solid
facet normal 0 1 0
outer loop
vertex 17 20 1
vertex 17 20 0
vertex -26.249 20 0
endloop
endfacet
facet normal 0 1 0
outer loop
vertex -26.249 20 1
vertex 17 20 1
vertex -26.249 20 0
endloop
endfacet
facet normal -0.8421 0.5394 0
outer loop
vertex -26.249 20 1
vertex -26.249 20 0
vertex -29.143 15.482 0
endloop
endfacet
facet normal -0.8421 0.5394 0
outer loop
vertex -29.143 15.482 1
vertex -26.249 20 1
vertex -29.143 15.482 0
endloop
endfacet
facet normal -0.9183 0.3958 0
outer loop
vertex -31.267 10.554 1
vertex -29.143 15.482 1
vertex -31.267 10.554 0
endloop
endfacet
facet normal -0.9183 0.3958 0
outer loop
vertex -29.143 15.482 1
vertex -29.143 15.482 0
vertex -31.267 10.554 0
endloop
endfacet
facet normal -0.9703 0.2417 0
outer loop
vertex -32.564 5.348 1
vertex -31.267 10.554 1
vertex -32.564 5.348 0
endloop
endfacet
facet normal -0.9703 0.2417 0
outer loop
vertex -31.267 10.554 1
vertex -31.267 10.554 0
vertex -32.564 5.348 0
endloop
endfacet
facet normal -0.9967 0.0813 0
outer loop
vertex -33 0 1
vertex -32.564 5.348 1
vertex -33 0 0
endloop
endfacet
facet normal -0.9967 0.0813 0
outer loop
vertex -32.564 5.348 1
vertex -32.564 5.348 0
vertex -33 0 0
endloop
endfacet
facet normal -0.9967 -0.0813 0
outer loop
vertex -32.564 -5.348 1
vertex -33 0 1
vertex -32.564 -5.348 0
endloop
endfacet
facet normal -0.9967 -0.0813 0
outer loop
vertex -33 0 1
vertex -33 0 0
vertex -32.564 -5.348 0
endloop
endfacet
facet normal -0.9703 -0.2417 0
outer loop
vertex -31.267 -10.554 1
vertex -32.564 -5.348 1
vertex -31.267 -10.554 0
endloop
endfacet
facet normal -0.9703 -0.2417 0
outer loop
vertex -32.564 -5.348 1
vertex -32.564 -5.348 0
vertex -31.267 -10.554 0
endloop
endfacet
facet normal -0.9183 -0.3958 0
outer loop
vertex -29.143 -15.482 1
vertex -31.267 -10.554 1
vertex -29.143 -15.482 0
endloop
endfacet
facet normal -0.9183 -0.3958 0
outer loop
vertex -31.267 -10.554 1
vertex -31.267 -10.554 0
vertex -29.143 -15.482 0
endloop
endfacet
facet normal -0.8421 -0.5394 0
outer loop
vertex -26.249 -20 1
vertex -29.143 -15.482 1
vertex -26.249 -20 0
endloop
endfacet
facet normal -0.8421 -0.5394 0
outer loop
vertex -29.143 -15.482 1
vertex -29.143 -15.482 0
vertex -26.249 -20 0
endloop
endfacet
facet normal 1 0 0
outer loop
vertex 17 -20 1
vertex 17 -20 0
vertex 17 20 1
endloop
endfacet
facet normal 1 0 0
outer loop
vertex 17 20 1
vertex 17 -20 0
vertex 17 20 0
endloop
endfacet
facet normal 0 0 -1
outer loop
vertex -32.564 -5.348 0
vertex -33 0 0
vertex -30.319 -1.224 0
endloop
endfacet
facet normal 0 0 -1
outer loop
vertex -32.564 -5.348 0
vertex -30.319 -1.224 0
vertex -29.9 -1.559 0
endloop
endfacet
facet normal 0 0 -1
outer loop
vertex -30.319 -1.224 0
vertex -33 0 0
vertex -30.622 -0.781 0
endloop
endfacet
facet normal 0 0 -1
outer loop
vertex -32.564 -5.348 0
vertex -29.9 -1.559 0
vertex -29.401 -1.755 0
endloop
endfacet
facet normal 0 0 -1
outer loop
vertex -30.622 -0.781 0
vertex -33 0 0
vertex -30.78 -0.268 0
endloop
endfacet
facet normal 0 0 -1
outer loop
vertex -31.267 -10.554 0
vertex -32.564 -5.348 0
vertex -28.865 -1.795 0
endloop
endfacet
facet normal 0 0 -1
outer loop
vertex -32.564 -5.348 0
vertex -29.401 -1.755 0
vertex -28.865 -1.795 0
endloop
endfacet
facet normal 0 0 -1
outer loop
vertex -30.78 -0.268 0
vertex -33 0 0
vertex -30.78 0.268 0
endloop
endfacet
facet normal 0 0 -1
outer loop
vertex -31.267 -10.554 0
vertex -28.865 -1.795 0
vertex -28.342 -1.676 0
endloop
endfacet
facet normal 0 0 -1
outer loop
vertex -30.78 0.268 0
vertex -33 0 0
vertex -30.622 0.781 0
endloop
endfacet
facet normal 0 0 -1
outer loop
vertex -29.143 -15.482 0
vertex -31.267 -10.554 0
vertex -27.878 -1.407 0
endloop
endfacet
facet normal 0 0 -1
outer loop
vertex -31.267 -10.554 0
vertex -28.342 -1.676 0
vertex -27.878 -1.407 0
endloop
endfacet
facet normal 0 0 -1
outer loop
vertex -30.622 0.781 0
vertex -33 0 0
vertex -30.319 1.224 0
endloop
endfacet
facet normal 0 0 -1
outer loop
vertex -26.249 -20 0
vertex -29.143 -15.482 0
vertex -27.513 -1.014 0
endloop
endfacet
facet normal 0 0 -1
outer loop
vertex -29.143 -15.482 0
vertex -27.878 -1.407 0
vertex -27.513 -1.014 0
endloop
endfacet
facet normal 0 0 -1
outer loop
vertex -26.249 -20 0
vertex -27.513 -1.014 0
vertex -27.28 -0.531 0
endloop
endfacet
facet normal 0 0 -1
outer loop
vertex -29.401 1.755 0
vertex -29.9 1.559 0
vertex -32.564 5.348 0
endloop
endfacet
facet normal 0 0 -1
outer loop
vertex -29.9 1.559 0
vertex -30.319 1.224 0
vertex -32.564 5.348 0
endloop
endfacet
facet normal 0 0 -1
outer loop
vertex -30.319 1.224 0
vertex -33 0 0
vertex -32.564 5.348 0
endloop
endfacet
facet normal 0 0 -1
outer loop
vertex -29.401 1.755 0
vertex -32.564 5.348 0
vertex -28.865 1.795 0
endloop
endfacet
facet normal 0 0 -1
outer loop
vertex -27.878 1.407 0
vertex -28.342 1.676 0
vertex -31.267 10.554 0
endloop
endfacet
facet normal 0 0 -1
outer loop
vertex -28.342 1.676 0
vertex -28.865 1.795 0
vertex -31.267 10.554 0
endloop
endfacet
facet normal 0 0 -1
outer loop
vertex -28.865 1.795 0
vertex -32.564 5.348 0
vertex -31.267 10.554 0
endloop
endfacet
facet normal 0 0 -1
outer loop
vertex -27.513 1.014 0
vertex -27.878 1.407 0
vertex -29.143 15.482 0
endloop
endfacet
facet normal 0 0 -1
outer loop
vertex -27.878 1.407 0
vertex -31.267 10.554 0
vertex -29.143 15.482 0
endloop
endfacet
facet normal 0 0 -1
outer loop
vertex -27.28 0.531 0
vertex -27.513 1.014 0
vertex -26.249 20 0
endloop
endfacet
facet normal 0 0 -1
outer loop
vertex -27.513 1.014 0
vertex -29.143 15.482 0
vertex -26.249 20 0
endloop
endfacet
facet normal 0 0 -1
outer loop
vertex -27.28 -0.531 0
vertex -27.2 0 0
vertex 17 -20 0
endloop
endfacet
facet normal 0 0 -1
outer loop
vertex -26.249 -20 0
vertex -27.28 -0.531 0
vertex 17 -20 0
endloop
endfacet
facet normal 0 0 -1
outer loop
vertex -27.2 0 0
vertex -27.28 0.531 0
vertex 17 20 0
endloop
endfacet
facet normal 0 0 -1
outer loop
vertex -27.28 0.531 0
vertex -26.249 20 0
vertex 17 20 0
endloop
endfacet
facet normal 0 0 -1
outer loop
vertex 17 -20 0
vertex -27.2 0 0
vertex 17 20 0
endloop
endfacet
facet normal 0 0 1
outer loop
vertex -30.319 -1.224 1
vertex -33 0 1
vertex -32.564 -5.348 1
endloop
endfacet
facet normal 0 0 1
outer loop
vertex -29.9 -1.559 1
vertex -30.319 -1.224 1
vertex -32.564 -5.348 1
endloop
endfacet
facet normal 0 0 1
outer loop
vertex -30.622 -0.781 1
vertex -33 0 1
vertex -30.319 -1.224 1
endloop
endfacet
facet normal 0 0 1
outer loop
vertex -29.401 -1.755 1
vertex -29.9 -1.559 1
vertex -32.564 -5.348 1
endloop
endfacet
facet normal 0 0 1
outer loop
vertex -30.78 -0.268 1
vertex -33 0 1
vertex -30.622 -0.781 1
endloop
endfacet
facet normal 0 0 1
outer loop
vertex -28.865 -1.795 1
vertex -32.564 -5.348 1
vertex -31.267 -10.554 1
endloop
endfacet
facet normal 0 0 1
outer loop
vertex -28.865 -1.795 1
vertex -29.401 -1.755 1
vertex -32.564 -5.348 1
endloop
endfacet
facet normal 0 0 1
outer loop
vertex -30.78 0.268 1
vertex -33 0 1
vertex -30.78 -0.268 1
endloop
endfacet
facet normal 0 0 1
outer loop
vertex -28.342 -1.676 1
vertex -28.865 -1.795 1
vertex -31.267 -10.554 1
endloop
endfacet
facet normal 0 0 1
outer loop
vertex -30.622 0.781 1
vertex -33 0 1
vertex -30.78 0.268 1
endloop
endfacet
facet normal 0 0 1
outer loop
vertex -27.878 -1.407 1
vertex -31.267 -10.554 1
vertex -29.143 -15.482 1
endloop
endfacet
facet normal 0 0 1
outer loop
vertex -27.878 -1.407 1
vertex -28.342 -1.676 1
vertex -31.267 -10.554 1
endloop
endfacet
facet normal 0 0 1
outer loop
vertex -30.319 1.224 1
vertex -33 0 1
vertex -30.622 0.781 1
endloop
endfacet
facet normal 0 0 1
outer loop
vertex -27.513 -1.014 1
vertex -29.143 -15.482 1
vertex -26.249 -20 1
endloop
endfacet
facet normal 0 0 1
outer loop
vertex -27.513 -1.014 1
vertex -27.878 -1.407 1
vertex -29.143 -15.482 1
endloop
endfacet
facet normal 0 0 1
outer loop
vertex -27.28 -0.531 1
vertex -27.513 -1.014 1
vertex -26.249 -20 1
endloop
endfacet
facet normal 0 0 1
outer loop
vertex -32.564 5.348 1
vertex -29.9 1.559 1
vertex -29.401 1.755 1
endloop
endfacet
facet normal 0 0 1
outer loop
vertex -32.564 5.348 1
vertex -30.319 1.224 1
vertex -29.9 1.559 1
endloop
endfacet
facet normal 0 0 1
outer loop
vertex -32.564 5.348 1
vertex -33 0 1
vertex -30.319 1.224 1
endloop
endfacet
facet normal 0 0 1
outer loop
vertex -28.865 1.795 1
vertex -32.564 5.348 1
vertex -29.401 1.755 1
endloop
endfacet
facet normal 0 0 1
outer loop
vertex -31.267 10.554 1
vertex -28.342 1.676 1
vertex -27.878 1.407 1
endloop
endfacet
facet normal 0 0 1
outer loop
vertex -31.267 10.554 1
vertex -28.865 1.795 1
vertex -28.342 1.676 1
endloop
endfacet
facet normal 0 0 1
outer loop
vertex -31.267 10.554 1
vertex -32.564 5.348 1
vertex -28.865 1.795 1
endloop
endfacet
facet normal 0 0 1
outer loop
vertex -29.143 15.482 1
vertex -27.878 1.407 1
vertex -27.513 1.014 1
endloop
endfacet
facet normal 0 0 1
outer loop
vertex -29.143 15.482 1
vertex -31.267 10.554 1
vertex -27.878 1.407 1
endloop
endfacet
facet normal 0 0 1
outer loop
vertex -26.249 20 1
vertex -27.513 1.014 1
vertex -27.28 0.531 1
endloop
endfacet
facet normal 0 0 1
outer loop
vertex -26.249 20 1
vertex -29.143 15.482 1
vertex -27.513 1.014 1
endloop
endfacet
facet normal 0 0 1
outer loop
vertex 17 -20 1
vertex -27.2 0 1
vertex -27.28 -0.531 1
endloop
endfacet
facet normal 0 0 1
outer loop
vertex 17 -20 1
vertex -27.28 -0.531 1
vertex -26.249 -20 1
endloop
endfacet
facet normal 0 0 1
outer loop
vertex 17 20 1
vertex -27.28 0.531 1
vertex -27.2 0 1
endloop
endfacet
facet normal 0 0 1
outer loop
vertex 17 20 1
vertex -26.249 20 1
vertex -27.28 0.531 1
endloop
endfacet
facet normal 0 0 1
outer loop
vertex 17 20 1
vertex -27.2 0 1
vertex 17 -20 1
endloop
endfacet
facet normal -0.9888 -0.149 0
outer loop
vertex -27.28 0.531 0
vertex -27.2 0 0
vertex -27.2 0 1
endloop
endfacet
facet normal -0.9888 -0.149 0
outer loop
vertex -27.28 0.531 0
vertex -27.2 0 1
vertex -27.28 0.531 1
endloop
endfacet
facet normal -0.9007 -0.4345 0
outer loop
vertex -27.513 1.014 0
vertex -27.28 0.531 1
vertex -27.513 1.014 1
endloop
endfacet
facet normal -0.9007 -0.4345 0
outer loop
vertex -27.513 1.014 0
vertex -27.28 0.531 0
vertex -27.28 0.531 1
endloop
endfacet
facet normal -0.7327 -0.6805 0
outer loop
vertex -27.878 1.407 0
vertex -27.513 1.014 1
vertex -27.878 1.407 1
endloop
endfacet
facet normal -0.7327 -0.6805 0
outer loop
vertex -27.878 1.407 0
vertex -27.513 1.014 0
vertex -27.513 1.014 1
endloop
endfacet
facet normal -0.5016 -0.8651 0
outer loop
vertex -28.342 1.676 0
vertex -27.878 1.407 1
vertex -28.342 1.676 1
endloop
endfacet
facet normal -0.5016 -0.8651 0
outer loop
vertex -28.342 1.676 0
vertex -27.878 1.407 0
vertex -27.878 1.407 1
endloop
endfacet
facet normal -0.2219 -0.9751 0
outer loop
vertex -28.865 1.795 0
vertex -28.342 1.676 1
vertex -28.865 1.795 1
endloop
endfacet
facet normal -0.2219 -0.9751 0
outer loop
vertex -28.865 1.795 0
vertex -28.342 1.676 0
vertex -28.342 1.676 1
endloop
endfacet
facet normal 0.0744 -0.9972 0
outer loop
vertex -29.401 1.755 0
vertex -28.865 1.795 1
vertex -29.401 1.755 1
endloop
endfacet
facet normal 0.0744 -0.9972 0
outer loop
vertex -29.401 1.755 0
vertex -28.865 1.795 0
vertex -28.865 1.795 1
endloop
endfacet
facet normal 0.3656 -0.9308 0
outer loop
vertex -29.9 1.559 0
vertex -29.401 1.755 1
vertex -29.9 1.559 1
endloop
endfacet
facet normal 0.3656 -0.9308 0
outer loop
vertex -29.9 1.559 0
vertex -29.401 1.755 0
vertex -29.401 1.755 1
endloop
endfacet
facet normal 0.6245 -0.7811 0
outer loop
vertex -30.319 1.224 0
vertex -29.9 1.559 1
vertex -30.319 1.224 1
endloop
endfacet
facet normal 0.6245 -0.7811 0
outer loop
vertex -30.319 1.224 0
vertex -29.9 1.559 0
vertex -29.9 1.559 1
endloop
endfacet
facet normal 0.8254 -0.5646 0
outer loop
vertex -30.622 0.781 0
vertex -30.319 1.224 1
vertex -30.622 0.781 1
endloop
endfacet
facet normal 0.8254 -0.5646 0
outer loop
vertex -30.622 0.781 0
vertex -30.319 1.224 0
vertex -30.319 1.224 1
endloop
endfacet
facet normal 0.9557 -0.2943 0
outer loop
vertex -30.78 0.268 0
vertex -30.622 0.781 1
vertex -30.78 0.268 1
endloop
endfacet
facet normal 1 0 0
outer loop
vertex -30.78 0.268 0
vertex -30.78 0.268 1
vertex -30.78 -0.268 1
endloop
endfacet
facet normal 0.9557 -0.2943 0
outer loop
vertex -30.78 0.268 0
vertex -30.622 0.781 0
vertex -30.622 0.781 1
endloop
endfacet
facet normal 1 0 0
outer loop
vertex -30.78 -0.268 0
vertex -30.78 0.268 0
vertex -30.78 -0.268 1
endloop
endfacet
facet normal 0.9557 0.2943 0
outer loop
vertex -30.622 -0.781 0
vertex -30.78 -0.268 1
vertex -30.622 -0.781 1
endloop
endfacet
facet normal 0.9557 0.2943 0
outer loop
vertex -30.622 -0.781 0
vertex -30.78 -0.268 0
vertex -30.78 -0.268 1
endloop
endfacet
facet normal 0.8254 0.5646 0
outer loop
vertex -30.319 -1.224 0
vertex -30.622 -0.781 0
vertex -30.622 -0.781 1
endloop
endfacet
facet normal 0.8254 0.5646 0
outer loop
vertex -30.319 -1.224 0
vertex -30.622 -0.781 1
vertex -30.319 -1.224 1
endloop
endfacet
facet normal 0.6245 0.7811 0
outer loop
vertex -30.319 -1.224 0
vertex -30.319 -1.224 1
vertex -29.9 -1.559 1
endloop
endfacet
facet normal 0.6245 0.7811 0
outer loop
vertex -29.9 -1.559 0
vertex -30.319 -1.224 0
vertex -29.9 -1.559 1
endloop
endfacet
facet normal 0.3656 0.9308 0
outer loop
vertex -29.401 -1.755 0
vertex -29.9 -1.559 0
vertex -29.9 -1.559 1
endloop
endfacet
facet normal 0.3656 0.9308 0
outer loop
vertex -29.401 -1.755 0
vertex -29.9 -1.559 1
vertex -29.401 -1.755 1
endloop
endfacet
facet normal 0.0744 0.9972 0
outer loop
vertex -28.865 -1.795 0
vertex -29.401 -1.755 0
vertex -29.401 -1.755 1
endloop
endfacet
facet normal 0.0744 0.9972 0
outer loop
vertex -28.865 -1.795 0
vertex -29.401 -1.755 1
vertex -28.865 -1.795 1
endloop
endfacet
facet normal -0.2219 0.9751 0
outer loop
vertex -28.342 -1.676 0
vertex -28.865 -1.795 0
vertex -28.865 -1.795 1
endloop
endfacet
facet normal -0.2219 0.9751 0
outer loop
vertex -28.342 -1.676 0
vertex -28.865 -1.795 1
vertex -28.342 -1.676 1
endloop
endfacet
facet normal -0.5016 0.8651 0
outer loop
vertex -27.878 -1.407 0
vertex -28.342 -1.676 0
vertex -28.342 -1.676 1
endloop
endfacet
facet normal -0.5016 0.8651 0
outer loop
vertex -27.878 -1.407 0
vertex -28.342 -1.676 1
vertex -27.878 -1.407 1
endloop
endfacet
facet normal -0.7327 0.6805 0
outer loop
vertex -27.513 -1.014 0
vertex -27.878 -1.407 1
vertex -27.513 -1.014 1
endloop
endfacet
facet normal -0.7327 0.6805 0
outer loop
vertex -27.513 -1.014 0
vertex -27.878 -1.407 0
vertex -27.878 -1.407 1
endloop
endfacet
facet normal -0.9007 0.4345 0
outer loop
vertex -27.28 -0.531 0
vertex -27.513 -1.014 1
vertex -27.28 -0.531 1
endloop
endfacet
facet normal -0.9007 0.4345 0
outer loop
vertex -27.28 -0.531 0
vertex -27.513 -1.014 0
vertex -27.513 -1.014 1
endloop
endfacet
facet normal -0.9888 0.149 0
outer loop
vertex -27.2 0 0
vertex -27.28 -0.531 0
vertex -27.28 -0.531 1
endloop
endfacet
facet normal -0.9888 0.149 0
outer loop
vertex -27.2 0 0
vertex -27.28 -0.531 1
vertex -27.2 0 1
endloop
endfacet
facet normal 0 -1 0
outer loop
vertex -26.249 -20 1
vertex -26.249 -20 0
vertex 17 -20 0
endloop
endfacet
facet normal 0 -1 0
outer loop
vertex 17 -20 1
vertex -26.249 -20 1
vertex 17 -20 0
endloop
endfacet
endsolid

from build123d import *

# Parameters (mm, degrees)
CROQUIS1_R              = 1.8
SALIENTE_EXTRUIR1_DEPTH = 1


with BuildPart() as part:
    # Croquis1 → Saliente-Extruir1 (new body)
    with BuildSketch(Plane.XY):
        with BuildLine():
            ThreePointArc((-26.248809497, 20), (-33, 0), (-26.248809497, -20))
            Line((-26.248809497, -20), (17, -20))
            Line((17, -20), (17, 20))
            Line((17, 20), (-26.248809497, 20))
        make_face()
        with Locations((-29, 0)):
            Circle(CROQUIS1_R, mode=Mode.SUBTRACT)
    extrude(amount=SALIENTE_EXTRUIR1_DEPTH)


solid = part.part
